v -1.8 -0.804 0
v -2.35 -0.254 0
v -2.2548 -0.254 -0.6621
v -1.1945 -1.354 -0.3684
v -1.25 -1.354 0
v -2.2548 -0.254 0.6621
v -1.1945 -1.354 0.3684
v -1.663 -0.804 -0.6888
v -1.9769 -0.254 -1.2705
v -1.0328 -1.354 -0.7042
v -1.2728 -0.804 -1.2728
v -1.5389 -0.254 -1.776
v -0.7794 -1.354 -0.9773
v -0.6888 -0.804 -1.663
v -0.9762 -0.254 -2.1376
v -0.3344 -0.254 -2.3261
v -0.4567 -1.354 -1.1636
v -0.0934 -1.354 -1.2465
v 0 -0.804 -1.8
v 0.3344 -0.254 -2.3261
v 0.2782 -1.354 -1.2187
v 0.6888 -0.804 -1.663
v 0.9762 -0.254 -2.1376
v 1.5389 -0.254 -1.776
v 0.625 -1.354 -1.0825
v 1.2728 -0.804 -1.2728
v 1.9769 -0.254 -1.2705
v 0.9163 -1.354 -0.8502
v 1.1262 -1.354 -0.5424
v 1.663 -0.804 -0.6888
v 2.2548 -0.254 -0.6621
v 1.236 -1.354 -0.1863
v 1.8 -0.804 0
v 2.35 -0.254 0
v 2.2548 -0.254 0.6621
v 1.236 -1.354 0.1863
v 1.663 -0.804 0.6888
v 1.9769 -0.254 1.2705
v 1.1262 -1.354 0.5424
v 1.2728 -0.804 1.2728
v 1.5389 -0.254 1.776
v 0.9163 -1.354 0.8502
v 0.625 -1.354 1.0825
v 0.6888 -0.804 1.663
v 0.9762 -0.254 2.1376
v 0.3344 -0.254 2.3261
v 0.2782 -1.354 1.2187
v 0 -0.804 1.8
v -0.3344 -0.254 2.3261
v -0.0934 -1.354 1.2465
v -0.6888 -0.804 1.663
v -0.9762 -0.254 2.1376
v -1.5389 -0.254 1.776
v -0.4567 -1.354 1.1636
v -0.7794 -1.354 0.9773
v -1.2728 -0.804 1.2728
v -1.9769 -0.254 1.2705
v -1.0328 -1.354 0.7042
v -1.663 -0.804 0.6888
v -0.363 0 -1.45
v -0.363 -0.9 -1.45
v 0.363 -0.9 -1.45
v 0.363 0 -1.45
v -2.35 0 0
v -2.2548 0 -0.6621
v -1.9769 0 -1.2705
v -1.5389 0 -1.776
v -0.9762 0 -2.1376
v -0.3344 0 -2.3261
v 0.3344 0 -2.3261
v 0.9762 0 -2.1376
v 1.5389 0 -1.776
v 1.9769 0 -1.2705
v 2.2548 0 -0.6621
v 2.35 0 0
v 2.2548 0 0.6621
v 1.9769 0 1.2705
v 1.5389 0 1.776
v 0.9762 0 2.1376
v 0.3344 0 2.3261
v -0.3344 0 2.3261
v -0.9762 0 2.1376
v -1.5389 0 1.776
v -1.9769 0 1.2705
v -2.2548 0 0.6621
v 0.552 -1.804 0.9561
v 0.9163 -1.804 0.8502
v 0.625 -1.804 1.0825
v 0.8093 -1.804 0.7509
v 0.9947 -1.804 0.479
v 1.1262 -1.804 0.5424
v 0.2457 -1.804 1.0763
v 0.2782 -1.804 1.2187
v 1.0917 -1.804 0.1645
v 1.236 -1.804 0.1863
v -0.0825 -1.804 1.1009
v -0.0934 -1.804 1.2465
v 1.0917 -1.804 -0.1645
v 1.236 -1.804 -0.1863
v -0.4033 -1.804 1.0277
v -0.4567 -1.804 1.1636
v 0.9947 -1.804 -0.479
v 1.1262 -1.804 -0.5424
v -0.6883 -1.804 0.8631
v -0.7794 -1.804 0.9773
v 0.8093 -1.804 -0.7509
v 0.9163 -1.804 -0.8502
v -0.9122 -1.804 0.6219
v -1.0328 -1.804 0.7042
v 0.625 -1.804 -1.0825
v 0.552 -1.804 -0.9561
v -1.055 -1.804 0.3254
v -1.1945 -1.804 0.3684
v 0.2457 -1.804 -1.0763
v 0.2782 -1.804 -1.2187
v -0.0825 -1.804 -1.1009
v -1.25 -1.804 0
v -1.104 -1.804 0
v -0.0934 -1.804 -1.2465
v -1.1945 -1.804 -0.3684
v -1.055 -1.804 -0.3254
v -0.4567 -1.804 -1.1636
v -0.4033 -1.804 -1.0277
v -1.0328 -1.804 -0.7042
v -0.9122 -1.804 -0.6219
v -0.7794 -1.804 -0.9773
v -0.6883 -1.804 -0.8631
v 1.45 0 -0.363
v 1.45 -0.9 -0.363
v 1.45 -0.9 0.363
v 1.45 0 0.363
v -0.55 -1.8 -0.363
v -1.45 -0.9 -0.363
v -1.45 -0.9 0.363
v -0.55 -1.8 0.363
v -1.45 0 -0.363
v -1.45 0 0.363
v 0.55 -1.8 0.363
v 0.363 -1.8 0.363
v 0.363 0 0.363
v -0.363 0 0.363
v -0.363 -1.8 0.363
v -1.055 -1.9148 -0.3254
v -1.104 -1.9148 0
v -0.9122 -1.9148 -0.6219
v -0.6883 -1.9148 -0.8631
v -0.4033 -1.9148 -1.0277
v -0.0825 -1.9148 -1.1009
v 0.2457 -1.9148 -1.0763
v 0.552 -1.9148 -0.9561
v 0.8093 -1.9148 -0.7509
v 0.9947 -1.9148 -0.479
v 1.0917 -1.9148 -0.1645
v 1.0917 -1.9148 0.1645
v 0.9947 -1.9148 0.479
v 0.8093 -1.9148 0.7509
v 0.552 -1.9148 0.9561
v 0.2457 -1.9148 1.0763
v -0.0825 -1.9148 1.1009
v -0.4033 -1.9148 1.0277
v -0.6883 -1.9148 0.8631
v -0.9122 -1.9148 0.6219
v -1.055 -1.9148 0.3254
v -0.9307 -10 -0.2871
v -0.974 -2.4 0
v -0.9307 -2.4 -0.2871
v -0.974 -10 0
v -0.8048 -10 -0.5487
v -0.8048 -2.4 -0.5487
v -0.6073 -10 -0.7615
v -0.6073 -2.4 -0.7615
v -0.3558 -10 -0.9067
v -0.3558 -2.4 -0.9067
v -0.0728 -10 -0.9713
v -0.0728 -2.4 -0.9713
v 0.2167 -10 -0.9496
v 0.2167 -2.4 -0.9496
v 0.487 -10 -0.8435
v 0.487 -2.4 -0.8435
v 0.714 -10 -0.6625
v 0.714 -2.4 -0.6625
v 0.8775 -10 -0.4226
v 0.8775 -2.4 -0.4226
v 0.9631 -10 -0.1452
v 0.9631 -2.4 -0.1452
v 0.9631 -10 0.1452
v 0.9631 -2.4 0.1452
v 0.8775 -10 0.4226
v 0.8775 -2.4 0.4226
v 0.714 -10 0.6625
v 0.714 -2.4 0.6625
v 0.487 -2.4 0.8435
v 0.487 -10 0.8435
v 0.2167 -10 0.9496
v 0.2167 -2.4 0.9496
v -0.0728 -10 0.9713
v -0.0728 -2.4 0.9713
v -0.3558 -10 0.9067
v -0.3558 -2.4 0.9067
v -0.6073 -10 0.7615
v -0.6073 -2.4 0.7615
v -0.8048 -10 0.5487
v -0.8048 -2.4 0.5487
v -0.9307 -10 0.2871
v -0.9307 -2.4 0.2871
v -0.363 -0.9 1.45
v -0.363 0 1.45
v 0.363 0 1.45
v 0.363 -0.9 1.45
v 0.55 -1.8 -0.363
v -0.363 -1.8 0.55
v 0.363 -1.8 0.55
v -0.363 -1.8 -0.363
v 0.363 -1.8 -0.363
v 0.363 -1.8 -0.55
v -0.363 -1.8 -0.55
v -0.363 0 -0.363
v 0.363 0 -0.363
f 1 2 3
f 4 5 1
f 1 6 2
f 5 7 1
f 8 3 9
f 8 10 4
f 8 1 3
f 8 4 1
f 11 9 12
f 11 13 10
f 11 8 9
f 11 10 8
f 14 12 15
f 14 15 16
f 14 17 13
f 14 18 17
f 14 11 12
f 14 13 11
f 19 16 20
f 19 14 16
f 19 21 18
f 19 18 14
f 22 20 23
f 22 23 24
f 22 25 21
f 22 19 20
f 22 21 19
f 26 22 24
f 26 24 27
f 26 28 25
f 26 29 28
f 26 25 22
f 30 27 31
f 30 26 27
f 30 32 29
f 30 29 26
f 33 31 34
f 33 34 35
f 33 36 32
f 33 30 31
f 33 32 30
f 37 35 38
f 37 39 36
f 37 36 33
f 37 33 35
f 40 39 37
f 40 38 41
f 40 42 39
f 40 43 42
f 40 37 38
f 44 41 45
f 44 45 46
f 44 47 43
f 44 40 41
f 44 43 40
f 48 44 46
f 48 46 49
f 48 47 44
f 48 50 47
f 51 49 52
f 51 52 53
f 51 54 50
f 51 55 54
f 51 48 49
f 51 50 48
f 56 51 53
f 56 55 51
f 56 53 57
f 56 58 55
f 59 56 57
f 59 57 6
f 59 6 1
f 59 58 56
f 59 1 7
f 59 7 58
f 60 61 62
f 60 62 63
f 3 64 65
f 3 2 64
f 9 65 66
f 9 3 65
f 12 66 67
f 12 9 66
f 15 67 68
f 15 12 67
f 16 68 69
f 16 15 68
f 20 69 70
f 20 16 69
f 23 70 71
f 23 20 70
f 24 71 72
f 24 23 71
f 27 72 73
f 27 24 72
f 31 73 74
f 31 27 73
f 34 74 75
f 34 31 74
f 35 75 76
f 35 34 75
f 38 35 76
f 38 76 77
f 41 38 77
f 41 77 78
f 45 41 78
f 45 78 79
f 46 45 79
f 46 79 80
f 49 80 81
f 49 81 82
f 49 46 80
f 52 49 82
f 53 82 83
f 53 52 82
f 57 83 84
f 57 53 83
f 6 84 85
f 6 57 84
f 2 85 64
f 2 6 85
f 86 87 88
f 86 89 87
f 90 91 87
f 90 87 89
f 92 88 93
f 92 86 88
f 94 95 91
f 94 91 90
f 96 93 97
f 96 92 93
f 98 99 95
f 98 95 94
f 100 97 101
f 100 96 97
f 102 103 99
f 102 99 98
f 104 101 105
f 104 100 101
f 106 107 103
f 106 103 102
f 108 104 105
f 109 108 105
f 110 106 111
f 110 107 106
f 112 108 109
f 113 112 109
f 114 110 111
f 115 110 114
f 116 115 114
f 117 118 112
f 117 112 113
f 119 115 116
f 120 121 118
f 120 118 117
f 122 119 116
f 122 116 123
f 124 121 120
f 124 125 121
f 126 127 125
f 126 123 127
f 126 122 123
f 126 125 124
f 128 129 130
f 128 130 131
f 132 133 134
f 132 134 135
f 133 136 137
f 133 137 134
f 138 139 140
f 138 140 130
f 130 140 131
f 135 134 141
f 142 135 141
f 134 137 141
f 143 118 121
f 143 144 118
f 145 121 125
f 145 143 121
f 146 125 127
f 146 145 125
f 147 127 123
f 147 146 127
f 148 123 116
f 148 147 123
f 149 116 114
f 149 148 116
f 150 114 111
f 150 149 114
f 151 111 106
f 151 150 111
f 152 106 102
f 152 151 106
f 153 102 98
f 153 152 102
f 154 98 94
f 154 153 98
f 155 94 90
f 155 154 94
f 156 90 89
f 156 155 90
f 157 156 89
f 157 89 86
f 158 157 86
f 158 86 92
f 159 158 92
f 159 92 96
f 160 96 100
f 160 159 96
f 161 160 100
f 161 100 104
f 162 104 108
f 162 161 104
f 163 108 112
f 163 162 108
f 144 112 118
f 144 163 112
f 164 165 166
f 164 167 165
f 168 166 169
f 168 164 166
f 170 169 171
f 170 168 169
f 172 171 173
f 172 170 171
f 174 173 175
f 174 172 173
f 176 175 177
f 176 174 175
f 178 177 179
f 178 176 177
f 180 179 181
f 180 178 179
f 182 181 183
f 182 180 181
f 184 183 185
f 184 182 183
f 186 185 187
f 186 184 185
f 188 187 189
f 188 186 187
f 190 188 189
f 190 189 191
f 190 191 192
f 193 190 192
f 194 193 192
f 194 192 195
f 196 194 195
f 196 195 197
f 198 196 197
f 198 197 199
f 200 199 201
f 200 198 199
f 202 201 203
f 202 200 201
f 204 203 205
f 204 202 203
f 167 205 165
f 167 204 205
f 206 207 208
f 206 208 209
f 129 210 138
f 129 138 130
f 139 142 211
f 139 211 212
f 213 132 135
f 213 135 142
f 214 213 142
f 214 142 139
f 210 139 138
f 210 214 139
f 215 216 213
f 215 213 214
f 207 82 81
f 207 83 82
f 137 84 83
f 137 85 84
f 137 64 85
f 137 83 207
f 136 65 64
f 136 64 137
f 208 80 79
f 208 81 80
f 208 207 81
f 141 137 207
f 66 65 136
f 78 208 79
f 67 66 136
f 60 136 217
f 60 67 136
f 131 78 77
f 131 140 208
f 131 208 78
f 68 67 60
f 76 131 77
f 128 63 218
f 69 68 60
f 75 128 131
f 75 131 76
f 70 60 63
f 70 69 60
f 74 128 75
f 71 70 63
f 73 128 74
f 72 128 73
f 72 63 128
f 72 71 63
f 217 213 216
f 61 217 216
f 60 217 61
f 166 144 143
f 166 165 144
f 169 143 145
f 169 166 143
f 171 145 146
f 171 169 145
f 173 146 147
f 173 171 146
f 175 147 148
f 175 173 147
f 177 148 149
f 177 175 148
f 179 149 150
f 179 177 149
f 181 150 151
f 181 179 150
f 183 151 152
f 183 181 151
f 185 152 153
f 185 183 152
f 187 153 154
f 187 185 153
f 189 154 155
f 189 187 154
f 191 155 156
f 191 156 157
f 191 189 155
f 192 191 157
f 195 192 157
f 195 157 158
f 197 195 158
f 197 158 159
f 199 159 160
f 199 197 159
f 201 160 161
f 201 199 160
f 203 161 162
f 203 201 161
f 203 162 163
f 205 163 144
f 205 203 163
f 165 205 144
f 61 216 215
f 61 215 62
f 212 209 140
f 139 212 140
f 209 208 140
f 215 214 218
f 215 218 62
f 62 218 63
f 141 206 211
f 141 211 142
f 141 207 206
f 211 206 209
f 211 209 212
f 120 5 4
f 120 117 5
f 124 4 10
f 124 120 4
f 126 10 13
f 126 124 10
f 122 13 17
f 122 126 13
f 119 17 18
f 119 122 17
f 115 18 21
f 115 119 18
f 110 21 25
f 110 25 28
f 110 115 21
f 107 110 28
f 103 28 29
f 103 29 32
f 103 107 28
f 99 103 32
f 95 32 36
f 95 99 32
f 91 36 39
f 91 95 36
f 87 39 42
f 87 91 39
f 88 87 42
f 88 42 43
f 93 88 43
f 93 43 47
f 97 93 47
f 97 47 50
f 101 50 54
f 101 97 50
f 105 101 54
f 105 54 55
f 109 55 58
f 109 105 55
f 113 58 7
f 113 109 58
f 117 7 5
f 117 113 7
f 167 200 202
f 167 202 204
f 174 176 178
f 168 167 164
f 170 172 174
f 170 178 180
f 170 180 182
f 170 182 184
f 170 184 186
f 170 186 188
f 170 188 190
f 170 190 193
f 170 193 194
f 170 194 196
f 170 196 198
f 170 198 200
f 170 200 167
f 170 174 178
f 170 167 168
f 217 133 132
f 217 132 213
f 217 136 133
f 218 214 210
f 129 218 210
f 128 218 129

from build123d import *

# Parameters (mm, degrees)
KREUZSCHLITZ1_H_DEPTH      = 0.363
KREUZSCHLITZ1_H_DEPTH_BACK = 0.363
KREUZSCHLITZ2_H_DEPTH      = 0.363
KREUZSCHLITZ2_H_DEPTH_BACK = 0.363


with BuildPart() as part:
    # Skizze1 → Basis-Rotation (revolve)
    with BuildSketch(Plane.XY, mode=Mode.PRIVATE) as basis_rotation_sk:
        Polygon((0, 0), (2.35, 0), (2.35, -0.254), (1.25, -1.354), (1.25, -1.804), (1.104, -1.804), (1.104, -1.914833395), (0.974, -2.4), (0.974, -10), (0, -10), align=None)
    revolve(basis_rotation_sk.sketch.rotate(Axis((0, 0, 0), (0, -1, 0)), 180), axis=Axis((0, 0, 0), (0, -1, 0)))

    # Skizze2 → Kreuzschlitz1 H (cut, two sides: drawn at the far end of the back side and taken through both)
    with BuildSketch(Plane.XY.offset(-KREUZSCHLITZ1_H_DEPTH_BACK)):
        Polygon((-0.55, -1.8), (0.55, -1.8), (1.45, -0.9), (1.45, 0), (-1.45, 0), (-1.45, -0.9), align=None)
    extrude(amount=KREUZSCHLITZ1_H_DEPTH + KREUZSCHLITZ1_H_DEPTH_BACK, mode=Mode.SUBTRACT)

    # Skizze3 → Kreuzschlitz2 H (cut, two sides: drawn at the far end of the back side and taken through both)
    with BuildSketch(Plane(origin=(0, 0, 0), x_dir=(0, 0, -1), z_dir=(1, 0, 0)).offset(-KREUZSCHLITZ2_H_DEPTH_BACK)):
        Polygon((-0.55, -1.8), (0.55, -1.8), (1.45, -0.9), (1.45, 0), (-1.45, 0), (-1.45, -0.9), align=None)
    extrude(amount=KREUZSCHLITZ2_H_DEPTH + KREUZSCHLITZ2_H_DEPTH_BACK, mode=Mode.SUBTRACT)


solid = part.part
